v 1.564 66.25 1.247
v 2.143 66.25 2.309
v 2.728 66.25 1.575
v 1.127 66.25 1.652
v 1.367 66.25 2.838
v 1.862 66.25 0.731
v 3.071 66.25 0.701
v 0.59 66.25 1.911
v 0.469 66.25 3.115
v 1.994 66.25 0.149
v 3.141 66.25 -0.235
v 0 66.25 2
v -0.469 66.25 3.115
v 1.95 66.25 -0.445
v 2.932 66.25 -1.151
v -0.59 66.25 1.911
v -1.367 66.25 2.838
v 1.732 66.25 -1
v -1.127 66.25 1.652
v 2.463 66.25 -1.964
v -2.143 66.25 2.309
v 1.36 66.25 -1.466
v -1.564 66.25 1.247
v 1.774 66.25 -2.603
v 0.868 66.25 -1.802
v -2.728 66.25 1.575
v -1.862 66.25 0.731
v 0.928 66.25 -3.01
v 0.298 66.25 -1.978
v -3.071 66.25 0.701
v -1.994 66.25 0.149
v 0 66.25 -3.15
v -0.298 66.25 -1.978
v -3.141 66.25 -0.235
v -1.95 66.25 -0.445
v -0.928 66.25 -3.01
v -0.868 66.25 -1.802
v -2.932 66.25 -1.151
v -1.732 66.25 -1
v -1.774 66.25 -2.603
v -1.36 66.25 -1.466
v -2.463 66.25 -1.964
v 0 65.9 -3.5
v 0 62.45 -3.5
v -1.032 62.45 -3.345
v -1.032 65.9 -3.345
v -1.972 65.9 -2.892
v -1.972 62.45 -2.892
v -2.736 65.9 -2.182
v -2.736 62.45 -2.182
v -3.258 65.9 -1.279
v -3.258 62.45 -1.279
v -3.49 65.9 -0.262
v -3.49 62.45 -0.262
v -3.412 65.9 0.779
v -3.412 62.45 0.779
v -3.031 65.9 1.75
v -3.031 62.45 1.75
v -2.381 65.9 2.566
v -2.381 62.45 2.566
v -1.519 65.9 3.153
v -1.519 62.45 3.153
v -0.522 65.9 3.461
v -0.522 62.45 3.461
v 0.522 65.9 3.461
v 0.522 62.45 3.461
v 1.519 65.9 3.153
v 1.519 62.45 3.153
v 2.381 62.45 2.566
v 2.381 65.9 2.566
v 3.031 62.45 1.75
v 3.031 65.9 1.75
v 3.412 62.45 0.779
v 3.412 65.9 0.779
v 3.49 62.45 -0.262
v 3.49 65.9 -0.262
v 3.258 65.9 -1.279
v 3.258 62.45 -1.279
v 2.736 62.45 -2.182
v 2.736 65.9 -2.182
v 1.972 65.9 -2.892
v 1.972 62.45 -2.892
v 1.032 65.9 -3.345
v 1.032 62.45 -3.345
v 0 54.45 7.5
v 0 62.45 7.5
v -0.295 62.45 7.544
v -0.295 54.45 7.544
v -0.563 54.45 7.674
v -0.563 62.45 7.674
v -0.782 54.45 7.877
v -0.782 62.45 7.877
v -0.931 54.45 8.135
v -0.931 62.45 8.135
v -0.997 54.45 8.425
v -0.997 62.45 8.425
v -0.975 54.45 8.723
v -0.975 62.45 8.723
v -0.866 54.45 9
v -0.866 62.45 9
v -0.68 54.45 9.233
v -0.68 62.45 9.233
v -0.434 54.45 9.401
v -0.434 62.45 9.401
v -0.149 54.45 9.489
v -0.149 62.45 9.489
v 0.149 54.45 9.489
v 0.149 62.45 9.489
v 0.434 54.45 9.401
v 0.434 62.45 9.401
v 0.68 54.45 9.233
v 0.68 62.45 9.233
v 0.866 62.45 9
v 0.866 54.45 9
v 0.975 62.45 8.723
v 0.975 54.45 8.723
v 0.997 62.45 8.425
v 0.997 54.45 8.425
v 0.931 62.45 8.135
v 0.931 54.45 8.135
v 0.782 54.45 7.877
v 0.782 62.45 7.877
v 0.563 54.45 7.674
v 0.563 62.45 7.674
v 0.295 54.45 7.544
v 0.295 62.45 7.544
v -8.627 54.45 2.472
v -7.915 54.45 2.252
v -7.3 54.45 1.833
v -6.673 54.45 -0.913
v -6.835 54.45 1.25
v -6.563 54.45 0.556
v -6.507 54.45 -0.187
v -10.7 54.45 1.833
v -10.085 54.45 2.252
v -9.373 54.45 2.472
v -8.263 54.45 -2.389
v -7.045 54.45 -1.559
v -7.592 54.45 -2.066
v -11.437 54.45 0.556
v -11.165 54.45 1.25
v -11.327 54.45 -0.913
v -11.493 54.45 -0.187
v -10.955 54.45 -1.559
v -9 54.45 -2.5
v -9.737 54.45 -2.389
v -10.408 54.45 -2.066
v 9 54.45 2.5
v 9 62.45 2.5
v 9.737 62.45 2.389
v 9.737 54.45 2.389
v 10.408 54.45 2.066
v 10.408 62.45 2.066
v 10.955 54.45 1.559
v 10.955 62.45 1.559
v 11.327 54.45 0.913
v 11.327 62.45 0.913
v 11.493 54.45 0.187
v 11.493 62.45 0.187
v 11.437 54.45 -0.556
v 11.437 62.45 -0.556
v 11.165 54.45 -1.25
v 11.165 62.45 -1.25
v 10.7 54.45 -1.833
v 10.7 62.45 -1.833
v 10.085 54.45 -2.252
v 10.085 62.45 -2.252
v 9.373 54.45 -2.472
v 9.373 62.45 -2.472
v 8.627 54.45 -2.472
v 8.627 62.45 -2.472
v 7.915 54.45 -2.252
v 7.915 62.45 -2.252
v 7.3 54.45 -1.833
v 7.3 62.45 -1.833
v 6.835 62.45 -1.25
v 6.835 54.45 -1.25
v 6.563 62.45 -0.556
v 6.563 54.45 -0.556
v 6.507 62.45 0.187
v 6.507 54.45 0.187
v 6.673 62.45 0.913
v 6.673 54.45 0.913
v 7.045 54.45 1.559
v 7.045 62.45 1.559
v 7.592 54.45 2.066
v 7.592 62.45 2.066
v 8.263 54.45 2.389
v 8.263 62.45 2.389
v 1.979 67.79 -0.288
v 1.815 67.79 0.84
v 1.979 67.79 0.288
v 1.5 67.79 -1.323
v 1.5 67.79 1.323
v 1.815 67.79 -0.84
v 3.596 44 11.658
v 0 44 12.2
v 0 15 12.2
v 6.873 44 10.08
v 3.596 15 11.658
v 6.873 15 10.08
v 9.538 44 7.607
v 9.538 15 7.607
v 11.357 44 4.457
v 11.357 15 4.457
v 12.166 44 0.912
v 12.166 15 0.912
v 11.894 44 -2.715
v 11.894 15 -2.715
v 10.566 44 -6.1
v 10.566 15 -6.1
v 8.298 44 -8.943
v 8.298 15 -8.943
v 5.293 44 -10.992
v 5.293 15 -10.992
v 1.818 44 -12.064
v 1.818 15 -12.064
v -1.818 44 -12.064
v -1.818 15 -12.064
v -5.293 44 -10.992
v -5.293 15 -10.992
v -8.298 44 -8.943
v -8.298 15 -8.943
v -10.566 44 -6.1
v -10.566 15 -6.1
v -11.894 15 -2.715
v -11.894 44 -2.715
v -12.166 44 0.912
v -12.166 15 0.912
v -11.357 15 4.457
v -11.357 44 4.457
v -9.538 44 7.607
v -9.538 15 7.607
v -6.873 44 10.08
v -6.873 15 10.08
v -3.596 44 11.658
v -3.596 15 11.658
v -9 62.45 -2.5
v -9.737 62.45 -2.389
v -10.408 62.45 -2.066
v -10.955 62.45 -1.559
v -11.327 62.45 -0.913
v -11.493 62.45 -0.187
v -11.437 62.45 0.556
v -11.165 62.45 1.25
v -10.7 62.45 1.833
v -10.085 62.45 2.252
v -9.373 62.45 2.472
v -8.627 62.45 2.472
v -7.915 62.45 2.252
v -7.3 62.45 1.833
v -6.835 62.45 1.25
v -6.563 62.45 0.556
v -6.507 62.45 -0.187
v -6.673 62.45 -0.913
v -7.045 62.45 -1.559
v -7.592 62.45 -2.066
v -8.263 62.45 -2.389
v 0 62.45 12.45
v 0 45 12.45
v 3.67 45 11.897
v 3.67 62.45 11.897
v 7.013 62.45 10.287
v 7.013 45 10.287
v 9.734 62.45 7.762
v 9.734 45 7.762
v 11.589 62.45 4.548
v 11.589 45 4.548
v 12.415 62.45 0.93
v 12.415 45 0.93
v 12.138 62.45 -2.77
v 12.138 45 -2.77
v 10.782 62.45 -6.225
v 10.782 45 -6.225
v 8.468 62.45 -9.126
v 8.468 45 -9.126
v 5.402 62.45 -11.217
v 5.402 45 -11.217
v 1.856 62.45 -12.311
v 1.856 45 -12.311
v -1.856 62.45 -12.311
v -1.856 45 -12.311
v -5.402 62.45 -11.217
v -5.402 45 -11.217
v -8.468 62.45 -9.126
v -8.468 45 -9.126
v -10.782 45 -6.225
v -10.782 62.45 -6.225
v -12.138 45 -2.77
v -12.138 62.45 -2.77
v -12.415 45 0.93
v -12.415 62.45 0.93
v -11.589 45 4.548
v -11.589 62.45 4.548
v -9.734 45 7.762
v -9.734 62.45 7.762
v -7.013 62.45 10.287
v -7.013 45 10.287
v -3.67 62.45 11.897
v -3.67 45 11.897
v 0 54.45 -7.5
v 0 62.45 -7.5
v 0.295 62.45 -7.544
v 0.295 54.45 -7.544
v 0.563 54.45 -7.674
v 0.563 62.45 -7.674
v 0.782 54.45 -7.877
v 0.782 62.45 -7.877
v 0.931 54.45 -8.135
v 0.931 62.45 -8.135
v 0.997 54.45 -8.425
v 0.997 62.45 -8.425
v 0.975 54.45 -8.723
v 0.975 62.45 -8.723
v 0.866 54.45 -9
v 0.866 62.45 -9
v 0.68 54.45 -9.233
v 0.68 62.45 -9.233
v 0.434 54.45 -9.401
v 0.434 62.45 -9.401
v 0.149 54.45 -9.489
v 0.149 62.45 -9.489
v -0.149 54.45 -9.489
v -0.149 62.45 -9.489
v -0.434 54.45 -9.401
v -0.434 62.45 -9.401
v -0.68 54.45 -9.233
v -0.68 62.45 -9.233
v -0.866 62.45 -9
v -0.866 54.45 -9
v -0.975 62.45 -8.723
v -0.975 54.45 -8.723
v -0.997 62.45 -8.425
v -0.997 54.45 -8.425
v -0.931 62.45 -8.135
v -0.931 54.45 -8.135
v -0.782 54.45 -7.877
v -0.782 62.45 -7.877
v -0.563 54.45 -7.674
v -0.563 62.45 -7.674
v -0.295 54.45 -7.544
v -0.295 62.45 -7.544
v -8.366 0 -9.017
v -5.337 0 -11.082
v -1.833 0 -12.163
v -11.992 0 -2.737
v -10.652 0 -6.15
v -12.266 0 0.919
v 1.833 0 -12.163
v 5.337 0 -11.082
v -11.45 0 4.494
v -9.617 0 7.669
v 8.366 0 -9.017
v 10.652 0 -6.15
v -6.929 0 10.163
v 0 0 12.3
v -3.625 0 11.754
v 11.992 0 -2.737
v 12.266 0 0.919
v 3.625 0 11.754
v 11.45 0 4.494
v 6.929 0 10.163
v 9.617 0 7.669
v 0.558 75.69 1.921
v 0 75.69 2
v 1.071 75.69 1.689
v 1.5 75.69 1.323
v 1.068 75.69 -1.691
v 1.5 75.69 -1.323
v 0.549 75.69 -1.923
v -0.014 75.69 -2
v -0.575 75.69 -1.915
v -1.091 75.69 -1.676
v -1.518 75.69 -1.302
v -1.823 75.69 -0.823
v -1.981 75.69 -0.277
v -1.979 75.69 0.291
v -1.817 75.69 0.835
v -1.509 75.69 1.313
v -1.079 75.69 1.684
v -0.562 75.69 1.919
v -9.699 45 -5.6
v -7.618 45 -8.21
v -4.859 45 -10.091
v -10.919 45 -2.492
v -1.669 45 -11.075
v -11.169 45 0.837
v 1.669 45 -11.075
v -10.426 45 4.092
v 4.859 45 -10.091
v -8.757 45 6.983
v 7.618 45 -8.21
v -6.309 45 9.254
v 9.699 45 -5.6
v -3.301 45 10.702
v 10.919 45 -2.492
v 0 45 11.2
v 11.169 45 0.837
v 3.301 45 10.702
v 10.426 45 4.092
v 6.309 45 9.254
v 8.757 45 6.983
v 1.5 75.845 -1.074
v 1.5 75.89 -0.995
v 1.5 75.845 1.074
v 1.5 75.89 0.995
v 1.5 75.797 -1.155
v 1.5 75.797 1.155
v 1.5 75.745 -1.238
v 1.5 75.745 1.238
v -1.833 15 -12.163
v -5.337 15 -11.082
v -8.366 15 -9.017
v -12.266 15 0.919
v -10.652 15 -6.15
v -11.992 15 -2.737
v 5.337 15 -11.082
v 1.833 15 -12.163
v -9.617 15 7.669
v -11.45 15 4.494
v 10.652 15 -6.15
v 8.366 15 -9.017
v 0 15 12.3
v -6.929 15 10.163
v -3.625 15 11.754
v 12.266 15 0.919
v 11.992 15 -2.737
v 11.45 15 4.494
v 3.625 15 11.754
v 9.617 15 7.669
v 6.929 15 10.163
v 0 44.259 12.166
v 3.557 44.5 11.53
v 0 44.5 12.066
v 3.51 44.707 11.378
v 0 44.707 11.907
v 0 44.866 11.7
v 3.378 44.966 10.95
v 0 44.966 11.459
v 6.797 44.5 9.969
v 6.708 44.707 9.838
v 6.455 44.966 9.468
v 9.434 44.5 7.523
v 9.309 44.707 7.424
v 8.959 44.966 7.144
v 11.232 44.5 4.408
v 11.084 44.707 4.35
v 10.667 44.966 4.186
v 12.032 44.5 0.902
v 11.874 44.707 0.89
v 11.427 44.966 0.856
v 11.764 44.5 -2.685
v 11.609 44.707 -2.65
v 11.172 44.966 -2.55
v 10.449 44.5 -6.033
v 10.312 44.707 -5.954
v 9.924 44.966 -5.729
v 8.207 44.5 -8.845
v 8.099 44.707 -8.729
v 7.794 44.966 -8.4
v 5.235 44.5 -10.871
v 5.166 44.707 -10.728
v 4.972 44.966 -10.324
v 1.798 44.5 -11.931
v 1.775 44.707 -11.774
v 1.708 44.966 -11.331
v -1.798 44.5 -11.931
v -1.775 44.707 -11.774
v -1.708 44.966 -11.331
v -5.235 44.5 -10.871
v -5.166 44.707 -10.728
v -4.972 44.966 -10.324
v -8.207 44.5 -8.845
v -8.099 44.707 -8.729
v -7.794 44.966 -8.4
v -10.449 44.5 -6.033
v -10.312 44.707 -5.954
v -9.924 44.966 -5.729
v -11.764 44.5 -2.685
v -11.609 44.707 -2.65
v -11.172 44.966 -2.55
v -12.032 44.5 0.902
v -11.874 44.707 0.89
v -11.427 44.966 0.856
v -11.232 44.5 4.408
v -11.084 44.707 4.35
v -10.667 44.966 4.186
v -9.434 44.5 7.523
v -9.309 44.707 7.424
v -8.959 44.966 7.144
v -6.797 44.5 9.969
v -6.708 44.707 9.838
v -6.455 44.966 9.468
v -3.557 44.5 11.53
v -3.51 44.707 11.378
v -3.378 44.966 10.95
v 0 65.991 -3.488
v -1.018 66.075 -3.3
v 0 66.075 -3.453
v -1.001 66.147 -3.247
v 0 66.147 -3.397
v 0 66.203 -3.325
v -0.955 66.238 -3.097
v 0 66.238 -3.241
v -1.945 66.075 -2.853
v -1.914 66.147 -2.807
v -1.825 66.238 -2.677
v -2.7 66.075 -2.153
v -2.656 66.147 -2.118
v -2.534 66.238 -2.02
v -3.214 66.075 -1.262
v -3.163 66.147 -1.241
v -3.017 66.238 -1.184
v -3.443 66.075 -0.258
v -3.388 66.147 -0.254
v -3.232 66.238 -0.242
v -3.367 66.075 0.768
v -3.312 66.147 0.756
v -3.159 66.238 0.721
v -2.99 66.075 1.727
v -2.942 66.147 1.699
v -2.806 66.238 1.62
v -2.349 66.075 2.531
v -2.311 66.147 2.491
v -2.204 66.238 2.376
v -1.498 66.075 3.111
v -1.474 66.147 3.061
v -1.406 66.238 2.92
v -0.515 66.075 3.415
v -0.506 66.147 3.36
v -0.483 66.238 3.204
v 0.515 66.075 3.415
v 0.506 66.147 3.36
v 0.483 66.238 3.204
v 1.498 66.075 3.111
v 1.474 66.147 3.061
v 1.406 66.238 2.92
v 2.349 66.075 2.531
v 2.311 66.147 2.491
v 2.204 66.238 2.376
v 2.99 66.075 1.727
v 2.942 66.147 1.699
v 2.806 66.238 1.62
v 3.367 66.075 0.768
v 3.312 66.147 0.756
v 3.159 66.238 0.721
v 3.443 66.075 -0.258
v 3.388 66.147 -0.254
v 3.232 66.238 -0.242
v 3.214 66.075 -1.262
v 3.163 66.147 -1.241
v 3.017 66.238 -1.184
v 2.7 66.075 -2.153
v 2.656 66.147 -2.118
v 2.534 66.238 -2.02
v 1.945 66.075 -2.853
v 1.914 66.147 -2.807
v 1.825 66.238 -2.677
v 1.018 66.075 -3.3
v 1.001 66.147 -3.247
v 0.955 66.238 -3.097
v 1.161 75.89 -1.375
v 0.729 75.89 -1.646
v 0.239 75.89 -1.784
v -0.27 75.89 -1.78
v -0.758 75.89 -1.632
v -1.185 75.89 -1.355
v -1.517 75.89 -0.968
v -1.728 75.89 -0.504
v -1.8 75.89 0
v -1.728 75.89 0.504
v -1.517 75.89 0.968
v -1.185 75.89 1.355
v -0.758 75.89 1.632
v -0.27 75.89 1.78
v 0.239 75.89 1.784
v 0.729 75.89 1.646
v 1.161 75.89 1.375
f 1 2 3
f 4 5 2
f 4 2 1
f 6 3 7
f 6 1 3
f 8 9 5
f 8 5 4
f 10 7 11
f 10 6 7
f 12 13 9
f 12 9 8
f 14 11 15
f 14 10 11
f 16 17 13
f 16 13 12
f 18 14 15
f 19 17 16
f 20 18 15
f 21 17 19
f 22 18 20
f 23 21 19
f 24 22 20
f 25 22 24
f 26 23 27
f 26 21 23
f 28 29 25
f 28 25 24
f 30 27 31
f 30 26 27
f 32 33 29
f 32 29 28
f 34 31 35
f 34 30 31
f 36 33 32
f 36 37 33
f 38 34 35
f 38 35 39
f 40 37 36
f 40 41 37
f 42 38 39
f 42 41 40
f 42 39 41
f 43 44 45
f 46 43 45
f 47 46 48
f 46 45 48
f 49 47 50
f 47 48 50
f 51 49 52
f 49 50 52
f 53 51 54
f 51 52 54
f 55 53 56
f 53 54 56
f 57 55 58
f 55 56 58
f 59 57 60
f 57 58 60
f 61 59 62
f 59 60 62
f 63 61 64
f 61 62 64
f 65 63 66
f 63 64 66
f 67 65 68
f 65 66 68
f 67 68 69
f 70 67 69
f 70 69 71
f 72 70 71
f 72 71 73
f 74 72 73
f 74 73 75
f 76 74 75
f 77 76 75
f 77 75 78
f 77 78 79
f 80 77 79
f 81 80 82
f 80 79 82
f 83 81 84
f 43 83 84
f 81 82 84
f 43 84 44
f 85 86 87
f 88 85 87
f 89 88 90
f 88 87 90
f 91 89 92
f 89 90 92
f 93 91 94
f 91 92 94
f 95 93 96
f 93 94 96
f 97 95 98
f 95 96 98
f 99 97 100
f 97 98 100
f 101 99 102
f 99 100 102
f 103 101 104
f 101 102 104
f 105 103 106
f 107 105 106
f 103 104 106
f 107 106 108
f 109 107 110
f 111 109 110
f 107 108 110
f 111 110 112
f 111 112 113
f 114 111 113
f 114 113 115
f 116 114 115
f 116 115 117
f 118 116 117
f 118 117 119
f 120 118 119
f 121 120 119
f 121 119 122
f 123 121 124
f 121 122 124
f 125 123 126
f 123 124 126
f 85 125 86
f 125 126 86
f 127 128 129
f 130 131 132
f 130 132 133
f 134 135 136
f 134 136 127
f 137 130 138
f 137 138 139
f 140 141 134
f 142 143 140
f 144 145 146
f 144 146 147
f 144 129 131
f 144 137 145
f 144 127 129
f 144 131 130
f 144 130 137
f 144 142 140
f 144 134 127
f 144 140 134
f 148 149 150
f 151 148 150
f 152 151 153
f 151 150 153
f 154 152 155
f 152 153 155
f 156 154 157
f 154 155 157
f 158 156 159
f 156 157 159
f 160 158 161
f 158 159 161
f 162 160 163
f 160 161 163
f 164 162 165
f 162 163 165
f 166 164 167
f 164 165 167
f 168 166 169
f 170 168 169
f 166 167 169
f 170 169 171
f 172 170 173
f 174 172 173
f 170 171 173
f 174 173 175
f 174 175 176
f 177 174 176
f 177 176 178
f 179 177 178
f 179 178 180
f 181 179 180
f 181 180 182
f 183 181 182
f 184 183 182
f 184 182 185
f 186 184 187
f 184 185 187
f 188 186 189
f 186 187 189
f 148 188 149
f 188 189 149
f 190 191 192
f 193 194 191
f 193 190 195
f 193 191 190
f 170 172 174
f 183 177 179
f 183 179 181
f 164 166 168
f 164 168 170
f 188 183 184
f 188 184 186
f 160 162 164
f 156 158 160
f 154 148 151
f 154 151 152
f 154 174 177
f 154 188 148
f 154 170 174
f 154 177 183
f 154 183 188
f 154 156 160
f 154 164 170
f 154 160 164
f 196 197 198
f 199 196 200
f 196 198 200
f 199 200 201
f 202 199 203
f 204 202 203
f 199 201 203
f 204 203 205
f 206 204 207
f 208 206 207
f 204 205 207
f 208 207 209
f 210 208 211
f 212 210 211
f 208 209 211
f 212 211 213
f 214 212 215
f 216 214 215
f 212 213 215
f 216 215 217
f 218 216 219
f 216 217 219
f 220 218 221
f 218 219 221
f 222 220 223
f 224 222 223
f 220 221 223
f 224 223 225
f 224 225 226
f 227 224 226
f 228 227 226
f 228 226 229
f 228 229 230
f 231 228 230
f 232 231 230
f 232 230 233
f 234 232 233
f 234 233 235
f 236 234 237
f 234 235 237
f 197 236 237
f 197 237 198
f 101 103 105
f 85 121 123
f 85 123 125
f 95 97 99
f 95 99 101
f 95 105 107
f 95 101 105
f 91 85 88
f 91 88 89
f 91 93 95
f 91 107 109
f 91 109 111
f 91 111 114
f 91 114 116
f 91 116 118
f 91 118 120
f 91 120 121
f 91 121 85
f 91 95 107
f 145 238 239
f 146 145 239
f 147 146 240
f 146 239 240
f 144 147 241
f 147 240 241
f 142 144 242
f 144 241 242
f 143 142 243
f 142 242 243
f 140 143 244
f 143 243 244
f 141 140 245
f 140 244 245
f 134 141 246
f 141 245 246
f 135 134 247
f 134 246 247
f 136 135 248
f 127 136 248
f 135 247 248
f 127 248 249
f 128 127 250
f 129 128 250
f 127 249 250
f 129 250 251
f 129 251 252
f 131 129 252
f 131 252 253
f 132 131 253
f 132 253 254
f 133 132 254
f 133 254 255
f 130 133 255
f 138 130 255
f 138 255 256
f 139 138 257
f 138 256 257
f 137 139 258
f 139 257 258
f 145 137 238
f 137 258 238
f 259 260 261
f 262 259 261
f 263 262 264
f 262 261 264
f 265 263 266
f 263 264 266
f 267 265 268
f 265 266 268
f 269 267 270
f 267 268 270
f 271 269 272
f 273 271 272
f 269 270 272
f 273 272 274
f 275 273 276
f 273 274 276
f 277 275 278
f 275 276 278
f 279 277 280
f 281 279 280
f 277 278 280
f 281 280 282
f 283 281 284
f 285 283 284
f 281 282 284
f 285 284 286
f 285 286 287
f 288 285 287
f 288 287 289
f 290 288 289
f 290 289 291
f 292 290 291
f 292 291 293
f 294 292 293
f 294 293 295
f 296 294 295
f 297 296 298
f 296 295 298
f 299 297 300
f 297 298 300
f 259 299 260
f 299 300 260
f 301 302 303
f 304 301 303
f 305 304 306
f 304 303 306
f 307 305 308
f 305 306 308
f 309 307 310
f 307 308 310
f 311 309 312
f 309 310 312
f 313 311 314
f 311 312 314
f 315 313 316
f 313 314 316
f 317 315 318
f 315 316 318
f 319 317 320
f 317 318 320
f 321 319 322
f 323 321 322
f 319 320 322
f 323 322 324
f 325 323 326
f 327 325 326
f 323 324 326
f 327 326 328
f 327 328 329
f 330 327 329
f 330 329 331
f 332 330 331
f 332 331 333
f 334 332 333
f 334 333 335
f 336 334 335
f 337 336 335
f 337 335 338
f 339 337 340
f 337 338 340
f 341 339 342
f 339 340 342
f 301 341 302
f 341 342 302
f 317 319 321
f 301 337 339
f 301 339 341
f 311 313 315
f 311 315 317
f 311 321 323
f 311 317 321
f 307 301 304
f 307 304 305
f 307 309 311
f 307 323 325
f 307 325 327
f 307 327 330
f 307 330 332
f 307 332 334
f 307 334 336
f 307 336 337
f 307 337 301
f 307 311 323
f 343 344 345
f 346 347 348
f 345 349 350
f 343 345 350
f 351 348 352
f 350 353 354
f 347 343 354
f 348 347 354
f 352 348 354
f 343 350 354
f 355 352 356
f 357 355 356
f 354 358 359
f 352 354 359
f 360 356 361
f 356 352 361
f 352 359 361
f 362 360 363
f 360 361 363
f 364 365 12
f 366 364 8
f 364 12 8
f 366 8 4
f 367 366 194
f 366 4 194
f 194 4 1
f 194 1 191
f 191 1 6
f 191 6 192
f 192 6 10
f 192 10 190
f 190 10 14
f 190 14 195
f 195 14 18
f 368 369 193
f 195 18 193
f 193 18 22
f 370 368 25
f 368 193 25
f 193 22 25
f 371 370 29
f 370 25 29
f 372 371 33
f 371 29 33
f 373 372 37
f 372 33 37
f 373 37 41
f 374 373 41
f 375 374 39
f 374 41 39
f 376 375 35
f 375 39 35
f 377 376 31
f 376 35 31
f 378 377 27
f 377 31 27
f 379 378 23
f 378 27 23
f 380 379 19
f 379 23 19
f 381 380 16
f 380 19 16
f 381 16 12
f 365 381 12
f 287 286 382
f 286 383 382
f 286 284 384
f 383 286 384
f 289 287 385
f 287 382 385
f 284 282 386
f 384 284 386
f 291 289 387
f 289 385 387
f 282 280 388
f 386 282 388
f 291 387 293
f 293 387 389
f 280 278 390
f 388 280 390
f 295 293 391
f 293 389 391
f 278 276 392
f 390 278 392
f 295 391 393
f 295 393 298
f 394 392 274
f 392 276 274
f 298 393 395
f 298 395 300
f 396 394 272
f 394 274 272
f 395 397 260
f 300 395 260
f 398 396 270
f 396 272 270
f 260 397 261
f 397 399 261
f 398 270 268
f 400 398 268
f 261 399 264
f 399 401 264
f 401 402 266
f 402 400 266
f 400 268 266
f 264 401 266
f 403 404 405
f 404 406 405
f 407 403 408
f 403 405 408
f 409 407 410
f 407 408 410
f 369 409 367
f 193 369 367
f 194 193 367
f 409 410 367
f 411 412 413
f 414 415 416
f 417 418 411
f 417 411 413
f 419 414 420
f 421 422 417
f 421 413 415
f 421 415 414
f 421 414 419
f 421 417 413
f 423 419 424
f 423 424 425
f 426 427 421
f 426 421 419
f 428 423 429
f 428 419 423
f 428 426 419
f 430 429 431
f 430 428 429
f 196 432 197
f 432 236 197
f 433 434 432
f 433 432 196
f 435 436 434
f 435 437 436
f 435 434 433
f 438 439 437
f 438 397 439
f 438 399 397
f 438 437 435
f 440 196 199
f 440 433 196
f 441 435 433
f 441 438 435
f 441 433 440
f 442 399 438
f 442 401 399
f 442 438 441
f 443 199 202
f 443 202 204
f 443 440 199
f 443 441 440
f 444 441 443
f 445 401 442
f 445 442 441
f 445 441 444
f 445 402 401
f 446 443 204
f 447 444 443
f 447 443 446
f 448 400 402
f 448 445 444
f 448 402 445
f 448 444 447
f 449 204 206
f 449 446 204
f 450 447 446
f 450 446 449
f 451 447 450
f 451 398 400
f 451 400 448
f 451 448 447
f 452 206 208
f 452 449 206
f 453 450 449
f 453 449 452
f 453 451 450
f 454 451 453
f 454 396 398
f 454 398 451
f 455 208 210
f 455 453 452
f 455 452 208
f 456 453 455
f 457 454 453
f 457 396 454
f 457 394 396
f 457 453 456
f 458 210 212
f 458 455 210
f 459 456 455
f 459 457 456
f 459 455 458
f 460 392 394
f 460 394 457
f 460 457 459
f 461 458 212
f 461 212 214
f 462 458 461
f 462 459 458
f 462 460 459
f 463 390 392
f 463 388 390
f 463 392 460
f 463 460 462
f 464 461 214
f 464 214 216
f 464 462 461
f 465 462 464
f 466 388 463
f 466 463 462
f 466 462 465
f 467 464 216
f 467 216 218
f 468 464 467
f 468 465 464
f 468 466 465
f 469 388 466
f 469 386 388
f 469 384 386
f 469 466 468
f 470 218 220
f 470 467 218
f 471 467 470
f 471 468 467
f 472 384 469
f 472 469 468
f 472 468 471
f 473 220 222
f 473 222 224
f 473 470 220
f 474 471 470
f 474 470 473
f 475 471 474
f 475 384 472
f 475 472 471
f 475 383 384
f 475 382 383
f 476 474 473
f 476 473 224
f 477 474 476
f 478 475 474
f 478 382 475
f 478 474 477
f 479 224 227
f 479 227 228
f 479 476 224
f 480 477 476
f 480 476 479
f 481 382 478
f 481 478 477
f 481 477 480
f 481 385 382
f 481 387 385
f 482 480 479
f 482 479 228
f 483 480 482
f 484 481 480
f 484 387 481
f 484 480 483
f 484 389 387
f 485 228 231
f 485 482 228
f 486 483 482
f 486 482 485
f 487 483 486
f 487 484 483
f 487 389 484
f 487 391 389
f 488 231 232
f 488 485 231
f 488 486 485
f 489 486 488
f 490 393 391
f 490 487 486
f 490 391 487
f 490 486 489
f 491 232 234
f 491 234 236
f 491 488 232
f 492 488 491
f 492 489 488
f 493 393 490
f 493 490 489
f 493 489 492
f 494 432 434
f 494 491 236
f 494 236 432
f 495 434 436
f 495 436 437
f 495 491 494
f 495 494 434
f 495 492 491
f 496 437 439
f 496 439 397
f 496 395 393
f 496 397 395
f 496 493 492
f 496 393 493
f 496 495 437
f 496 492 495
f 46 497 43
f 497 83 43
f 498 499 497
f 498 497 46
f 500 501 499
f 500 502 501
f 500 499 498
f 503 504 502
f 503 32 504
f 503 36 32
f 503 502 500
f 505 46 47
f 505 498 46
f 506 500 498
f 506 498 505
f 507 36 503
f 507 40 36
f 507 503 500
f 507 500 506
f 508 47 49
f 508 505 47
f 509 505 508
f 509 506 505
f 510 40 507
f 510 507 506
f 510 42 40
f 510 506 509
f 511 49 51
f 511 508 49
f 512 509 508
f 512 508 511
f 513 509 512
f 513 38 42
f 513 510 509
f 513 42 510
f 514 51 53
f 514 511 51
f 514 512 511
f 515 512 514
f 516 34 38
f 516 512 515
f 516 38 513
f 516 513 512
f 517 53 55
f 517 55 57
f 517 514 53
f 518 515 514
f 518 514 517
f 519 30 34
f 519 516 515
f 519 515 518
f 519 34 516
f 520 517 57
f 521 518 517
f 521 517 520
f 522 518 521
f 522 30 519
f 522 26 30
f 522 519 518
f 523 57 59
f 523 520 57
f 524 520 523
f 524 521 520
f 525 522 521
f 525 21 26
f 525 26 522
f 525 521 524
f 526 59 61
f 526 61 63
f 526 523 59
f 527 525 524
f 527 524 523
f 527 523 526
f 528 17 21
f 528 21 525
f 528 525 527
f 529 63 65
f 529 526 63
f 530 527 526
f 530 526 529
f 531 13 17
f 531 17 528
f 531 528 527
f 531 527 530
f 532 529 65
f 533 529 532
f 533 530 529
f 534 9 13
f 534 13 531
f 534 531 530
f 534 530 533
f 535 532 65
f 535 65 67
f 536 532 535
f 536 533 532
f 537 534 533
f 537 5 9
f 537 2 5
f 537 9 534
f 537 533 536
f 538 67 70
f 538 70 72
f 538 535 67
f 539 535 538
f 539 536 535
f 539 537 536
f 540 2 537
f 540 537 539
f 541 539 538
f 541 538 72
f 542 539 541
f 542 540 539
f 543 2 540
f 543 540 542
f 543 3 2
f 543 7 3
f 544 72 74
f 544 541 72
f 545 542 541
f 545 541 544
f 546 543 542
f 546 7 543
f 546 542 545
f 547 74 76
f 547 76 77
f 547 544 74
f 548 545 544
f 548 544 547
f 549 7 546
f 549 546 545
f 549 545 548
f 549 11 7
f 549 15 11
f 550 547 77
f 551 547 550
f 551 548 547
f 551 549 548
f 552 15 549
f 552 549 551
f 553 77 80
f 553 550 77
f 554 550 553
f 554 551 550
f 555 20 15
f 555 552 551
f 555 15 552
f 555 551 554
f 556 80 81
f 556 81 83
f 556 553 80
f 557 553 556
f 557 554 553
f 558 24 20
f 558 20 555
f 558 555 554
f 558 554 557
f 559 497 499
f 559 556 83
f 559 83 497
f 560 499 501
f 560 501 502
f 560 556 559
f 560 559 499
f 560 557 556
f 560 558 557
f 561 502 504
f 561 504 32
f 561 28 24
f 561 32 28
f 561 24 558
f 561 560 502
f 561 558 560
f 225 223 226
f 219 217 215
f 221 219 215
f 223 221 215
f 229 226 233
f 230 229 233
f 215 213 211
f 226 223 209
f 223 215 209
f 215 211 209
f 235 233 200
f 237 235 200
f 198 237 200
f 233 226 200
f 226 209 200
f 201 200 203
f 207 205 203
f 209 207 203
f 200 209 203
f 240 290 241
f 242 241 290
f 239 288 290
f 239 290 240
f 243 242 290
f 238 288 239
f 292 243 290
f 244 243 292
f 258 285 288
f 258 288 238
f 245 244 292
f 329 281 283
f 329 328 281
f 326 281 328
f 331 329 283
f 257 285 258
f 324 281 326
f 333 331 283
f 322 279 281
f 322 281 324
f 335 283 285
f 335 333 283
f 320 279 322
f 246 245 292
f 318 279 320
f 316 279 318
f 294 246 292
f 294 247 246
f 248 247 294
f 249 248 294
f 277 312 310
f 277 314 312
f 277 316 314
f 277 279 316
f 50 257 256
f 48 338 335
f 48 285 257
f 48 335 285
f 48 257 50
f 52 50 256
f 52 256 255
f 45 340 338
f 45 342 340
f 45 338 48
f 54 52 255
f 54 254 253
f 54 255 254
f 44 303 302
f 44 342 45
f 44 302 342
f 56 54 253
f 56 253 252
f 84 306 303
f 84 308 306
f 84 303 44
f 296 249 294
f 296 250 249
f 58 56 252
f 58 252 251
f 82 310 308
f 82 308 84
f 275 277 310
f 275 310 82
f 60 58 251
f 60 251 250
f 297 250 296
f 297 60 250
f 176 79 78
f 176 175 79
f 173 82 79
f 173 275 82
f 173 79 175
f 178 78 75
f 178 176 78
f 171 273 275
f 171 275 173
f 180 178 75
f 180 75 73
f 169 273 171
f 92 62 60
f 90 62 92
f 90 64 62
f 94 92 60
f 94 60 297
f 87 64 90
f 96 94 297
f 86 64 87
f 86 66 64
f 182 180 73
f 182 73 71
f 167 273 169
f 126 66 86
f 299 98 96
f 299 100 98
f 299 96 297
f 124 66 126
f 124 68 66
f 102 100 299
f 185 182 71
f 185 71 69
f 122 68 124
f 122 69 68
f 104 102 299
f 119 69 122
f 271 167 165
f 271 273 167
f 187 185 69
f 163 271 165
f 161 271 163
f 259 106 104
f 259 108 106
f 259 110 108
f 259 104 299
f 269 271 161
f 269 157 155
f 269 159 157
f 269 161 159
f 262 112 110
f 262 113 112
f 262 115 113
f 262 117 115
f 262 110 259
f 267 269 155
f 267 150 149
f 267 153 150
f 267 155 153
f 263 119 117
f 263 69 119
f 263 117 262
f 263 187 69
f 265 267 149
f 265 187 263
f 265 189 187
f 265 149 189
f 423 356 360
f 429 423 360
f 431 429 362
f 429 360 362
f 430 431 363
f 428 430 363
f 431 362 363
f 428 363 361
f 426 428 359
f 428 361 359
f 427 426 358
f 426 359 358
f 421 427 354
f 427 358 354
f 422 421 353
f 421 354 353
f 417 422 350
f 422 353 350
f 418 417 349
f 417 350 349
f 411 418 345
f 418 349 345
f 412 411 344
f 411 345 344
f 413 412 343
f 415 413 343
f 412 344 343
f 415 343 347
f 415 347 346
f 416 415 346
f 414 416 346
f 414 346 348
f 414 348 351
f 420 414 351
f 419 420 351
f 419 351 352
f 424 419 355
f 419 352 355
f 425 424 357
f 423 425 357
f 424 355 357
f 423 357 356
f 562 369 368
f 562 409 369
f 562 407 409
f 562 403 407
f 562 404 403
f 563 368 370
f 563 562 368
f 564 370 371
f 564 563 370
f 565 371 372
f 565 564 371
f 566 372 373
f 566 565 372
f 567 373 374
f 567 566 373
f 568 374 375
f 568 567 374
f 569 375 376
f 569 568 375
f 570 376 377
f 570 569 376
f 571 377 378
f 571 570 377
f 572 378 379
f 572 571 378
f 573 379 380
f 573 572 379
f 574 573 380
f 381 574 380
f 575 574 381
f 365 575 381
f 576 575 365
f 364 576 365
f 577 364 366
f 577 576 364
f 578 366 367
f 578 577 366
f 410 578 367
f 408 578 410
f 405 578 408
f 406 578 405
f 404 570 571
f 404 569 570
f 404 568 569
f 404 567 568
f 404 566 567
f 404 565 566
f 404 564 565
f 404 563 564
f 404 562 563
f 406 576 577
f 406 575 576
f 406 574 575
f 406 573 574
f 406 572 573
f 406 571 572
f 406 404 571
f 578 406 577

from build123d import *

# Parameters (mm, degrees)
CROQUIS1_R              = 12.3
SALIENTE_EXTRUIR1_DEPTH = 15
CROQUIS2_R              = 12.2
SALIENTE_EXTRUIR2_DEPTH = 30
REDONDEO1_R             = 1
CROQUIS3_R              = 12.45
SALIENTE_EXTRUIR3_DEPTH = 17.45
CROQUIS4_R              = 1
CROQUIS4_R_2            = 2.5
CORTAR_EXTRUIR1_DEPTH   = 8
CROQUIS5_R              = 3.5
SALIENTE_EXTRUIR4_DEPTH = 3.8
REDONDEO2_R             = 0.35
CROQUIS6_R              = 2
SALIENTE_EXTRUIR5_DEPTH = 9.64
CHAFL_N1_SIZE           = 0.2
CORTAR_EXTRUIR2_DEPTH   = 8.1


with BuildPart() as part:
    # Croquis1 → Saliente-Extruir1 (new body)
    with BuildSketch(Plane(origin=(0, 0, 0), x_dir=(1, 0, 0), z_dir=(0, 1, 0))):
        with Locations(Location((0, 0, 0), (0, 0, 270))):
            Circle(CROQUIS1_R)
    extrude(amount=SALIENTE_EXTRUIR1_DEPTH)


with BuildPart() as body_2:
    # Croquis2 → Saliente-Extruir2 (new body)
    with BuildSketch(Plane(origin=(0, 15, 0), x_dir=(1, 0, 0), z_dir=(0, 1, 0))):
        with Locations(Location((0, 0, 0), (0, 0, 270))):
            Circle(CROQUIS2_R)
    extrude(amount=SALIENTE_EXTRUIR2_DEPTH)

    # Redondeo1
    redondeo1_edges = [body_2.edges().sort_by_distance(p)[0] for p in [
        (0, 45, -12.2),
    ]]
    fillet(redondeo1_edges, radius=REDONDEO1_R)

    # Croquis3 → Saliente-Extruir3 (add)
    with BuildSketch(Plane(origin=(0, 45, 0), x_dir=(1, 0, 0), z_dir=(0, 1, 0))):
        with Locations(Location((0, 0, 0), (0, 0, 270))):
            Circle(CROQUIS3_R)
    extrude(amount=SALIENTE_EXTRUIR3_DEPTH)

    # Croquis4 → Cortar-Extruir1 (cut)
    with BuildSketch(Plane(origin=(0, 62.45, 0), x_dir=(1, 0, 0), z_dir=(0, 1, 0))):
        with Locations(Location((0, 8.5, 0), (0, 0, 270))):
            Circle(CROQUIS4_R)
        with Locations(Location((0, -8.5, 0), (0, 0, 90))):
            Circle(CROQUIS4_R)
        with Locations(Location((9, 0, 0), (0, 0, 270))):
            Circle(CROQUIS4_R_2)
        with Locations(Location((-9, 0, 0), (0, 0, 90))):
            Circle(CROQUIS4_R_2)
    extrude(amount=-CORTAR_EXTRUIR1_DEPTH, mode=Mode.SUBTRACT)

    # Croquis5 → Saliente-Extruir4 (add)
    with BuildSketch(Plane(origin=(0, 62.45, 0), x_dir=(1, 0, 0), z_dir=(0, 1, 0))):
        with Locations(Location((0, 0, 0), (0, 0, 90))):
            Circle(CROQUIS5_R)
    extrude(amount=SALIENTE_EXTRUIR4_DEPTH)

    # Redondeo2
    redondeo2_edges = [body_2.edges().sort_by_distance(p)[0] for p in [
        (0, 66.25, 3.5),
    ]]
    fillet(redondeo2_edges, radius=REDONDEO2_R)

    # Croquis6 → Saliente-Extruir5 (add)
    with BuildSketch(Plane(origin=(0, 66.25, 0), x_dir=(1, 0, 0), z_dir=(0, 1, 0))):
        with Locations(Location((0, 0, 0), (0, 0, 270))):
            Circle(CROQUIS6_R)
    extrude(amount=SALIENTE_EXTRUIR5_DEPTH)

    # Chaflán1
    chafl_n1_edges = [body_2.edges().sort_by_distance(p)[0] for p in [
        (0, 75.89, -2),
    ]]
    chamfer(chafl_n1_edges, length=CHAFL_N1_SIZE)

    # Croquis7 → Cortar-Extruir2 (cut)
    with BuildSketch(Plane(origin=(0, 75.89, 0), x_dir=(1, 0, 0), z_dir=(0, 1, 0))):
        with BuildLine():
            Line((1.5, 1.322875656), (1.5, -1.322875656))
            ThreePointArc((1.5, -1.322875656), (2, 0), (1.5, 1.322875656))
        make_face()
    extrude(amount=-CORTAR_EXTRUIR2_DEPTH, mode=Mode.SUBTRACT)


solid = Compound([part.part, body_2.part])
